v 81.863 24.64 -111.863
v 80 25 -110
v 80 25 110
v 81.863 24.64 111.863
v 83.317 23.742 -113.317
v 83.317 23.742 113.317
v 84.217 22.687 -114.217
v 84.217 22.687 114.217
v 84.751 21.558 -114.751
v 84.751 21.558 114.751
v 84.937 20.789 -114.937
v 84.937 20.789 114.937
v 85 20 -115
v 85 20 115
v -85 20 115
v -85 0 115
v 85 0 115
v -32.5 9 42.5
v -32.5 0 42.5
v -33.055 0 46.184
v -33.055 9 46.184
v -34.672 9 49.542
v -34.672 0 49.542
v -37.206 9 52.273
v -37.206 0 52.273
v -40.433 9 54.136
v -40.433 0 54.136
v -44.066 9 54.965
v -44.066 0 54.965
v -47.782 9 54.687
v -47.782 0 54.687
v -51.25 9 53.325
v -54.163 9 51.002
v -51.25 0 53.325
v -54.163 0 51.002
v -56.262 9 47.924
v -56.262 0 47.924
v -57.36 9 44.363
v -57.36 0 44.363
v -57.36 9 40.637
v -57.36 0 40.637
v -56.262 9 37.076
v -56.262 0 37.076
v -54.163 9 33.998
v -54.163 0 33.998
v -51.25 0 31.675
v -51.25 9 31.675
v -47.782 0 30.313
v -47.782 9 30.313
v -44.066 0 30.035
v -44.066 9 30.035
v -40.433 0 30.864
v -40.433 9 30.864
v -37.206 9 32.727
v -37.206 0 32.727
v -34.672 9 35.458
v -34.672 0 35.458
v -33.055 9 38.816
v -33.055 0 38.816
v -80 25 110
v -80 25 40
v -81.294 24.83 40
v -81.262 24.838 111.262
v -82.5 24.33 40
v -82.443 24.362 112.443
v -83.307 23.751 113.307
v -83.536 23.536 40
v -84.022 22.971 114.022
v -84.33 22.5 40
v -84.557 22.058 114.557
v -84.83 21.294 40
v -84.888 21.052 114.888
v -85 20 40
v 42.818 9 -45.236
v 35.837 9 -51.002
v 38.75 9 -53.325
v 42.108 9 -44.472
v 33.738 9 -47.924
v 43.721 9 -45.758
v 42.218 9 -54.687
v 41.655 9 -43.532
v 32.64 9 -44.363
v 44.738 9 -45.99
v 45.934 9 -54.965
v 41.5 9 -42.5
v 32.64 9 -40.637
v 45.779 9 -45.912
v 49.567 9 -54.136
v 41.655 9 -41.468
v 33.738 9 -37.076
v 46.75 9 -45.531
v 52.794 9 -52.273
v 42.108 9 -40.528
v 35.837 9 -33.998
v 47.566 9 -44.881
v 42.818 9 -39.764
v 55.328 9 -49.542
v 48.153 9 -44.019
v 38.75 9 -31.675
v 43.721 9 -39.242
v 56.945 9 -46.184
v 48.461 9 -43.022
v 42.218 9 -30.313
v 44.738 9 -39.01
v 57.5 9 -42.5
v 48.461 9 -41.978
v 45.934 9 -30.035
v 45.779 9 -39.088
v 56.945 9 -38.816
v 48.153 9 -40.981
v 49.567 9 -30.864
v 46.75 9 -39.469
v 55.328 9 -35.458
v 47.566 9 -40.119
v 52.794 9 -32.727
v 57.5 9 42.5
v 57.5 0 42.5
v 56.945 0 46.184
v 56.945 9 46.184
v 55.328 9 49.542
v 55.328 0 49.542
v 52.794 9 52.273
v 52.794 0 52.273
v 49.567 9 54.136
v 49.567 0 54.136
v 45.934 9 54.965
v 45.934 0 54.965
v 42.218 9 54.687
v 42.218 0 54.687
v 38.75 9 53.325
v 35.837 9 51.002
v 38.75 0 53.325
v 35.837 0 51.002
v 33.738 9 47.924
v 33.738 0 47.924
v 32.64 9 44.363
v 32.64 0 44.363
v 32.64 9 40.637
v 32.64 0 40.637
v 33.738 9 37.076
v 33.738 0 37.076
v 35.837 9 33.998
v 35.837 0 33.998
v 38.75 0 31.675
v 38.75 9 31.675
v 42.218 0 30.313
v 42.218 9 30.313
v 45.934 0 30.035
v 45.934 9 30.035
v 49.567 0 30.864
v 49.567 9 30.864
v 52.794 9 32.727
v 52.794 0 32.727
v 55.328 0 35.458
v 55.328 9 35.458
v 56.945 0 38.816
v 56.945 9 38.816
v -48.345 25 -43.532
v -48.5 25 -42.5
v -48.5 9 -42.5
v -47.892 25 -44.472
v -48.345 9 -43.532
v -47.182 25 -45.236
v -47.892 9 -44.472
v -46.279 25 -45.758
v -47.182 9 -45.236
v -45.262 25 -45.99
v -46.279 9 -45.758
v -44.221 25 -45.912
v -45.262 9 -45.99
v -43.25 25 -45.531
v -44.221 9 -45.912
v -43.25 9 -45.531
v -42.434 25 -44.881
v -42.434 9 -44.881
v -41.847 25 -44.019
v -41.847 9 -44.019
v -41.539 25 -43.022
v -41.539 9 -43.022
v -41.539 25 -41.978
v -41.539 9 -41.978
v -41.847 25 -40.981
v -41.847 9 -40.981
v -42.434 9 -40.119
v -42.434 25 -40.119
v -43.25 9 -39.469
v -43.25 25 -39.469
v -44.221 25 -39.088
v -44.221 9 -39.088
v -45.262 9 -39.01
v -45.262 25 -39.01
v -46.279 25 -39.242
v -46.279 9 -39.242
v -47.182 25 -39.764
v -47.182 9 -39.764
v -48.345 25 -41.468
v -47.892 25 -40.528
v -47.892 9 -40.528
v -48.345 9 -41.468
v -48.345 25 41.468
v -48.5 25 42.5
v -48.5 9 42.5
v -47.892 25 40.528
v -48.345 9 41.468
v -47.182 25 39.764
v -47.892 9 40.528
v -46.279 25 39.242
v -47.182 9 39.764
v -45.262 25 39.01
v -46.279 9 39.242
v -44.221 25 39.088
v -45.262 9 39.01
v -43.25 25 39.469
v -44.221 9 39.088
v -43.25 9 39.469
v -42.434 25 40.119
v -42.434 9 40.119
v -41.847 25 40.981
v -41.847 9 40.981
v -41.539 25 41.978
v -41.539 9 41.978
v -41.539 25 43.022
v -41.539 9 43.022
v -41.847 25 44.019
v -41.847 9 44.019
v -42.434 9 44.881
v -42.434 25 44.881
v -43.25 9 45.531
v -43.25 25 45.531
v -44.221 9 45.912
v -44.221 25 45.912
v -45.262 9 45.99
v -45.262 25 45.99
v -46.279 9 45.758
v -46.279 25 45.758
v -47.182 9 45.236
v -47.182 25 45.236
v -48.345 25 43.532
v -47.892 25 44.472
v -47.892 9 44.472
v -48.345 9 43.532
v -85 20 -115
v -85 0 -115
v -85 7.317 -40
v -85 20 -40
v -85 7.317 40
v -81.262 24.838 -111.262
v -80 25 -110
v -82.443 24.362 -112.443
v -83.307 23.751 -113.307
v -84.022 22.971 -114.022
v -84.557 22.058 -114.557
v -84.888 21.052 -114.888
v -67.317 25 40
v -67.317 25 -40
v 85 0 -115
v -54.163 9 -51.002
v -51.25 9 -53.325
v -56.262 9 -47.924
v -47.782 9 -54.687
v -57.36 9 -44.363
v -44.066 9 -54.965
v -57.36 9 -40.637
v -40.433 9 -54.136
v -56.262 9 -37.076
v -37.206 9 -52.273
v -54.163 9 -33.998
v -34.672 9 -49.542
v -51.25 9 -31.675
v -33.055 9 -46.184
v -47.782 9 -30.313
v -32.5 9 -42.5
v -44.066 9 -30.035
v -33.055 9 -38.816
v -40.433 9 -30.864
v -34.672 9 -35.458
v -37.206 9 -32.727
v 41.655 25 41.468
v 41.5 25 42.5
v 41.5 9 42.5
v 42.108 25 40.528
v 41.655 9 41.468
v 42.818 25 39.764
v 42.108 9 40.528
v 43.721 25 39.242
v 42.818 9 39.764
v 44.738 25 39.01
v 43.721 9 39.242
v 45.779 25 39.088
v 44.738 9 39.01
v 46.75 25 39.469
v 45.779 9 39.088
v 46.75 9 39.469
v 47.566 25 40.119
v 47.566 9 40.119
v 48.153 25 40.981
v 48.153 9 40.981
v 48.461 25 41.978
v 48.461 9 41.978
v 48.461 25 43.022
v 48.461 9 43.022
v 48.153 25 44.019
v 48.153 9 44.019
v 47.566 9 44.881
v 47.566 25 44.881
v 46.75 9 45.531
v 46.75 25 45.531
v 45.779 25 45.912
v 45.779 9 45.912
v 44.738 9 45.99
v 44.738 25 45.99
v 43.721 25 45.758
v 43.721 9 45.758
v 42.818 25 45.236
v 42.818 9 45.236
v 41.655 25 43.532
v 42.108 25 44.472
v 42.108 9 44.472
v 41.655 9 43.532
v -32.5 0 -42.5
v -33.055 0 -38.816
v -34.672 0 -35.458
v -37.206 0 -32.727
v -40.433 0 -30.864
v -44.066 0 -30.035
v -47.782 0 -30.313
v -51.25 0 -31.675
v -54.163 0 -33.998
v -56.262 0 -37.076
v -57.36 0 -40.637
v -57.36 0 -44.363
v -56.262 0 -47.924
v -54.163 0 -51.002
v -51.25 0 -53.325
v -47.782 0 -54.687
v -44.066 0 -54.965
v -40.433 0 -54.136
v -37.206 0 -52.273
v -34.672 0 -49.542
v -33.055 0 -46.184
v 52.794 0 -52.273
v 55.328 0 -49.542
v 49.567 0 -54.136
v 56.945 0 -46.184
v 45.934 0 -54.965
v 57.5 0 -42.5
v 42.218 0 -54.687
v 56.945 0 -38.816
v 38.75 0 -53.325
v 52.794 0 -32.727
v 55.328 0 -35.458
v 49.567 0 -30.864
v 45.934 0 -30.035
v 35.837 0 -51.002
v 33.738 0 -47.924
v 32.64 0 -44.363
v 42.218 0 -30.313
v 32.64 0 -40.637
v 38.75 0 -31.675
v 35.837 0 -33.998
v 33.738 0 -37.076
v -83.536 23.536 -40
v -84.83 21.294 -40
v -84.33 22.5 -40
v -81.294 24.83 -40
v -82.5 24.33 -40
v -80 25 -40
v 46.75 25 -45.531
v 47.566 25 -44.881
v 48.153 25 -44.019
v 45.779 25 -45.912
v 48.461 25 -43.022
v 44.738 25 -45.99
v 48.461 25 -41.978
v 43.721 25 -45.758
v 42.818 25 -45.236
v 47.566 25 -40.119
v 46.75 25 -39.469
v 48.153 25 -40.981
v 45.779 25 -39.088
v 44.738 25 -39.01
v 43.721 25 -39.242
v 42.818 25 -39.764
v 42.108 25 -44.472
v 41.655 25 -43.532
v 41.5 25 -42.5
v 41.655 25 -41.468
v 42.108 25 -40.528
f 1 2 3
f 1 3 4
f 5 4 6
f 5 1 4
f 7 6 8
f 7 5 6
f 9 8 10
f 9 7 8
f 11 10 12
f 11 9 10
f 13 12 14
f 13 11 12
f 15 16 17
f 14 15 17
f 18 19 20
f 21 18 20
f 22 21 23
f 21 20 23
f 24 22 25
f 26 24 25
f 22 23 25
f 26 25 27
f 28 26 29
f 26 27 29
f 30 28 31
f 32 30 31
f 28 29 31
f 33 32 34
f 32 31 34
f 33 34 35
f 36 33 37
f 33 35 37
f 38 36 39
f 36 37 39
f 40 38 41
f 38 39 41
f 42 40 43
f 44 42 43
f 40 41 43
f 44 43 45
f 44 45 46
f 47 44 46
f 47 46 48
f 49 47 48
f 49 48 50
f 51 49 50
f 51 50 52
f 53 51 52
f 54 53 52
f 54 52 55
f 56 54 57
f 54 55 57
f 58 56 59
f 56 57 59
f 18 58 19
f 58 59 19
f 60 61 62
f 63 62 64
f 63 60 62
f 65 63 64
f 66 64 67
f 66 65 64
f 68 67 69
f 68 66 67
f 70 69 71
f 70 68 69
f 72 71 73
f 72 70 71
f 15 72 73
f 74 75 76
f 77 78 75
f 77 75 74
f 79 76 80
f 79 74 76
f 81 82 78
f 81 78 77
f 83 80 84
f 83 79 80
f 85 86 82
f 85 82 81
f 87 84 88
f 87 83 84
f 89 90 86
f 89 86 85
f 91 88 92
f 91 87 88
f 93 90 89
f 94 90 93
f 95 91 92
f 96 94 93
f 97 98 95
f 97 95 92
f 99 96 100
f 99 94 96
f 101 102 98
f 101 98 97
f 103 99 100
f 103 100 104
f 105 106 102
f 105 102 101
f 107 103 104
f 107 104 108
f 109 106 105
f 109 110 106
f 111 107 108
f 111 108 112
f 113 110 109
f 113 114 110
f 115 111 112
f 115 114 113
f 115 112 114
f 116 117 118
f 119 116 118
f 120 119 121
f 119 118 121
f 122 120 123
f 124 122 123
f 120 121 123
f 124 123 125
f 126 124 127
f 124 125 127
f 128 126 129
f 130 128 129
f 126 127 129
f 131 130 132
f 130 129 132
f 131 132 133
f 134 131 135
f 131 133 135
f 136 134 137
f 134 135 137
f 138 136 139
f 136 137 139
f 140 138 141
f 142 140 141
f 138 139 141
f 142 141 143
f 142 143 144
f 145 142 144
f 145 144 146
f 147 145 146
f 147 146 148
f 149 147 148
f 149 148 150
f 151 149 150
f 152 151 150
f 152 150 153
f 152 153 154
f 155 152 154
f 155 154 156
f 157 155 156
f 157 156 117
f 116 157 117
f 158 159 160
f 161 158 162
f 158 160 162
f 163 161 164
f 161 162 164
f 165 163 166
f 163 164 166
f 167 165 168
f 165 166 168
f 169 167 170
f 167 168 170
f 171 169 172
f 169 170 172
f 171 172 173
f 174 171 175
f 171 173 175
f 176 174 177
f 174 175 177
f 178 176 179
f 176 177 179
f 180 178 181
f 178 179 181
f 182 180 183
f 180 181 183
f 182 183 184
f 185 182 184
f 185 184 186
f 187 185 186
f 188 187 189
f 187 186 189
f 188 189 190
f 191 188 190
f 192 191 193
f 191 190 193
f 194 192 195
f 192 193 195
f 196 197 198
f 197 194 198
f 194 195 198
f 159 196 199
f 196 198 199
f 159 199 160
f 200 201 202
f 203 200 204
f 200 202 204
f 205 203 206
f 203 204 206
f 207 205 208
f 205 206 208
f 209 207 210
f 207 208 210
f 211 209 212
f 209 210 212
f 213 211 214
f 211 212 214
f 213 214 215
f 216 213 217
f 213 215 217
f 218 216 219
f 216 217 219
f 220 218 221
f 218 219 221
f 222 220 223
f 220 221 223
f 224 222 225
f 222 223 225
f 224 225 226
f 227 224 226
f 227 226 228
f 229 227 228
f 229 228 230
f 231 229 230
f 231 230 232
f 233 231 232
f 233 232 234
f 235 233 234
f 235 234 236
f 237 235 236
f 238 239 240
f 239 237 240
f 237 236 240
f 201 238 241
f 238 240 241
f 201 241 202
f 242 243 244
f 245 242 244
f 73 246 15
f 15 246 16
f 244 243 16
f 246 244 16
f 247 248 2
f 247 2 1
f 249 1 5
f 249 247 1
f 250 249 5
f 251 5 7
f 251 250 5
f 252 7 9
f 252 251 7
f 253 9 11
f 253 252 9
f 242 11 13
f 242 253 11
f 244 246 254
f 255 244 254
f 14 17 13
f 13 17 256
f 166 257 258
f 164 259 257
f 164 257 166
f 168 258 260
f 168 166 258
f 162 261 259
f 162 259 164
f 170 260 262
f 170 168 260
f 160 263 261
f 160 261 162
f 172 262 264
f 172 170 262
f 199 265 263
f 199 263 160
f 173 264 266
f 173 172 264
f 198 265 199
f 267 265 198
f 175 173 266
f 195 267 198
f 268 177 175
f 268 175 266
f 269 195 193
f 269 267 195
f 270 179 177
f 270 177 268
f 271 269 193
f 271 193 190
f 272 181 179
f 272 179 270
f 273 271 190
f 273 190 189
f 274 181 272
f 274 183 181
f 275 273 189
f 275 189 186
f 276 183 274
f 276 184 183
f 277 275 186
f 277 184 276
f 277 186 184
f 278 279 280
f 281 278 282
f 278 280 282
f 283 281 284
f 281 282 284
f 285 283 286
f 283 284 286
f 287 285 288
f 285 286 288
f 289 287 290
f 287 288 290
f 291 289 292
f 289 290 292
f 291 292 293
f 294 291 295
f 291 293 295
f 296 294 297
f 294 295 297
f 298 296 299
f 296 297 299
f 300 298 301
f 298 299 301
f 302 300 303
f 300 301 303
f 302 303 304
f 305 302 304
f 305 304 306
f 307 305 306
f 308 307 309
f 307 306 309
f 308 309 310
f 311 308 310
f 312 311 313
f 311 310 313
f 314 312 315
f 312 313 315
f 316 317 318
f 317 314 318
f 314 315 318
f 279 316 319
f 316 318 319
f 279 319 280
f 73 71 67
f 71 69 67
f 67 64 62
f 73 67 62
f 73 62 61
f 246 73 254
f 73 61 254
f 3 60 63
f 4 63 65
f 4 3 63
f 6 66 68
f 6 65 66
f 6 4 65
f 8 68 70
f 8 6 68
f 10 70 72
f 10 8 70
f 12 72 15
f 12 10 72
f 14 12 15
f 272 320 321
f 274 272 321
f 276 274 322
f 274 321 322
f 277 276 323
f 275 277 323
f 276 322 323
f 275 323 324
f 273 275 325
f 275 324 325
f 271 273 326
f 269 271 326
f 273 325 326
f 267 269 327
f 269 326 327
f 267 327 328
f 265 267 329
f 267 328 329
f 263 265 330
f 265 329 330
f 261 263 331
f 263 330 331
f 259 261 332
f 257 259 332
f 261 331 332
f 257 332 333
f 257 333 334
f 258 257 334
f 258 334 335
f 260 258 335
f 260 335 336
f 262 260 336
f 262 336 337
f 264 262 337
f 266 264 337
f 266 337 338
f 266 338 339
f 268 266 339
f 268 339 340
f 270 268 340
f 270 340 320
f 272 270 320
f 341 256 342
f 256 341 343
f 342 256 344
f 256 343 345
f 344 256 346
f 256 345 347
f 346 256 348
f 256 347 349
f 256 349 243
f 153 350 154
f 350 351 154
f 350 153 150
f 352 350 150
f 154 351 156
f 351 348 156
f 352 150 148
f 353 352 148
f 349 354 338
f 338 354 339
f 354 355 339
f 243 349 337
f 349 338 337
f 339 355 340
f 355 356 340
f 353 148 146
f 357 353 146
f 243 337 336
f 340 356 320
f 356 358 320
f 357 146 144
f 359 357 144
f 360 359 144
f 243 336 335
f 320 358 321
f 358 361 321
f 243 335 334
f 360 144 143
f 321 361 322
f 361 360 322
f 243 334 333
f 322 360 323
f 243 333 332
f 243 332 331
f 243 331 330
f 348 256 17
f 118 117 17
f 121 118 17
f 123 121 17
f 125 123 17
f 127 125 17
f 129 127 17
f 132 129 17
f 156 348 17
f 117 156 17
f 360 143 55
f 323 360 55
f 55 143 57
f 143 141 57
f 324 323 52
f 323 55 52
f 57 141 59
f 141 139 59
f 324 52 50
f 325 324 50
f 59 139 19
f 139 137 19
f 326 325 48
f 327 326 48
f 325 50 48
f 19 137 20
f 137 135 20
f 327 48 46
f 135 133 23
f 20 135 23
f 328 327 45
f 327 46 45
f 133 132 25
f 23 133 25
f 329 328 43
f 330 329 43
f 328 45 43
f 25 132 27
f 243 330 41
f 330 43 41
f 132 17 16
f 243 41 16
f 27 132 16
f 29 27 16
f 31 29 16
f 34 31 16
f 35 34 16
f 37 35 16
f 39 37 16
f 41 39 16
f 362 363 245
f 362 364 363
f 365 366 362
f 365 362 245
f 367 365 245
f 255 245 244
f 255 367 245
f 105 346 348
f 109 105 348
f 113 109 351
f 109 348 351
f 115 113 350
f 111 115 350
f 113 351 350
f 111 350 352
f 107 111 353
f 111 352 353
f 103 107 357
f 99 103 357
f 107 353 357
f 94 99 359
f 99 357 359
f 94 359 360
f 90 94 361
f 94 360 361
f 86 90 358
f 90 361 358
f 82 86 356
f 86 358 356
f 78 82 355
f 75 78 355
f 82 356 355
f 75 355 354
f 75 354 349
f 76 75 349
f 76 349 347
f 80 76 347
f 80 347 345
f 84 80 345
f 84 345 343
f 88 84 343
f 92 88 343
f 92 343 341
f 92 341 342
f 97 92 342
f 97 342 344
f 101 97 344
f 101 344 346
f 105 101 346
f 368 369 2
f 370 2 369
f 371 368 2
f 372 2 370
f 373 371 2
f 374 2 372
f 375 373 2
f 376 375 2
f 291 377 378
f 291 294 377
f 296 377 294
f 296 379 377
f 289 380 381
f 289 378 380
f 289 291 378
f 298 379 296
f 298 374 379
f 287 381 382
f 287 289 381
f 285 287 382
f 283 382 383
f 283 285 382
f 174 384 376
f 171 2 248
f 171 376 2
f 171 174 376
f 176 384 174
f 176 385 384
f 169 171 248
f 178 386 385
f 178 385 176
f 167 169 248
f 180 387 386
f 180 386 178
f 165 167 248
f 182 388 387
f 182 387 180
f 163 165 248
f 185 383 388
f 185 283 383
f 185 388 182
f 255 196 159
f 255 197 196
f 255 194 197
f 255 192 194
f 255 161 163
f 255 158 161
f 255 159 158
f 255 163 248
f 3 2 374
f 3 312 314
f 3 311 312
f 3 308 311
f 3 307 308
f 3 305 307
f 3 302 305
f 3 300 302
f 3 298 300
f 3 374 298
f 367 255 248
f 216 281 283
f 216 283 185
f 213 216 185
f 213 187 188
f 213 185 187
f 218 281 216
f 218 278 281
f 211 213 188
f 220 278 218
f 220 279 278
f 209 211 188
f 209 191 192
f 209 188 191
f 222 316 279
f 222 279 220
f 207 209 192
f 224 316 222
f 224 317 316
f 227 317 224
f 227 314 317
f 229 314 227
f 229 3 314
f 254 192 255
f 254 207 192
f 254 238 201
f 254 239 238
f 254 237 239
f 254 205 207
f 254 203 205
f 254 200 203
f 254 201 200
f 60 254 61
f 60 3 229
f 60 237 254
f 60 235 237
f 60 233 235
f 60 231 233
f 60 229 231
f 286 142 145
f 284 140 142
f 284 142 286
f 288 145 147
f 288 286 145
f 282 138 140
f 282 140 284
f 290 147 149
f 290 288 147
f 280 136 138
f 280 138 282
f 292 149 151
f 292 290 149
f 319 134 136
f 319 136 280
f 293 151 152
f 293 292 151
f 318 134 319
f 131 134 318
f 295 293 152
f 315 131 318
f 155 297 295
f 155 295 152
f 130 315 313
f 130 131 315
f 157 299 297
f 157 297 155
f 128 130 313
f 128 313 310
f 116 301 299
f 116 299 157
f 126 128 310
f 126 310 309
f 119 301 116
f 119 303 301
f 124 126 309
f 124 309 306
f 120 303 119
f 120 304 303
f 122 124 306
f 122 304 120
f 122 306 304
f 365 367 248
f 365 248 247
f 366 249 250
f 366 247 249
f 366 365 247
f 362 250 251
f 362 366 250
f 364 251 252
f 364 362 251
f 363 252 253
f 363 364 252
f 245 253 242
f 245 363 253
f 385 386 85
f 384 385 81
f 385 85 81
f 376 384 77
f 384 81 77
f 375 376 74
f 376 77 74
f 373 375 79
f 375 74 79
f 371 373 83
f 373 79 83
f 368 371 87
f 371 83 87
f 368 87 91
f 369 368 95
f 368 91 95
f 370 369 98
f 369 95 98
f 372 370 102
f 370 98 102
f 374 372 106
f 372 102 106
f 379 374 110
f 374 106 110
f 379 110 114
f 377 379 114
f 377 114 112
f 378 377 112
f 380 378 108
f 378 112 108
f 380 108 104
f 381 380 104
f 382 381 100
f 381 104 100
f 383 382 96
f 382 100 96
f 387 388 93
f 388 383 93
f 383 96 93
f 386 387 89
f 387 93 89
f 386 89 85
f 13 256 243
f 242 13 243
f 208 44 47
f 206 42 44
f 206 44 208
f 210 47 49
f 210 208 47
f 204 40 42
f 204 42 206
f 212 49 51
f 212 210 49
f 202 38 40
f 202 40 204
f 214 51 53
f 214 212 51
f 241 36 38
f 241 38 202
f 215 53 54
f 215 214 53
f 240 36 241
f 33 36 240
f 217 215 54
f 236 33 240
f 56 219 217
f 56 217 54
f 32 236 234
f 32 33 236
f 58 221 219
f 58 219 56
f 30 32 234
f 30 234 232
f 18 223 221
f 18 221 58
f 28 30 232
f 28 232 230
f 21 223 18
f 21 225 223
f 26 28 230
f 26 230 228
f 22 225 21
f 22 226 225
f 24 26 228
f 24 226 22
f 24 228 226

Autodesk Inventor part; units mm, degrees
ref_plane "YZ Plane" through (0, 0, 0) normal (1, 0, 0) x (0, 1, 0)
ref_plane "XZ Plane" through (0, 0, 0) normal (0, 1, 0) x (-1, 0, 0)
ref_plane "XY Plane" through (0, 0, 0) normal (0, 0, 1) x (1, 0, 0)
sketch "Sketch1" plane through (0, 0, 0) normal (0, 1, 0) x (-1, 0, 0)
  line L0 (85, 115) -> (-85, 115)
  line L1 (-85, 115) -> (-85, -115)
  line L2 (-85, -115) -> (85, -115)
  line L3 (85, -115) -> (85, 115)
  line L4 (85, 115) -> (-85, -115) construction
  line L5 (-85, 115) -> (85, -115) construction
  line L6 (-85, 115) -> (-85, 42.5) construction
  line L7 (-85, 42.5) -> (-85, -42.5) construction
  line L8 (-85, 42.5) -> (-45, 42.5) construction
  line L9 (-45, 42.5) -> (45, 42.5) construction
  line L10 (45, 42.5) -> (45, -42.5) construction
  line L11 (-85, -42.5) -> (-45, -42.5) construction
  line L12 (-45, -42.5) -> (45, -42.5) construction
  circle A0 centre (-45, 42.5) radius 3.5
  circle A1 centre (45, 42.5) radius 3.5
  circle A2 centre (45, -42.5) radius 3.5
  line L13 (-45, 42.5) -> (-45, -42.5) construction
  circle A3 centre (-45, -42.5) radius 3.5
  point P0 (0, 0)
  dimension "d3" = 85
  dimension "d7" = 7
  dimension "d8" = 7
extrude "Extrusion1" add sketch "Sketch1" along normal blind 25
sketch "Sketch2" plane through (0, 0, 0) normal (0, -1, 0) x (1, 0, 0)
  circle A0 centre (-45, -42.5) radius 3.5 projected
  circle A1 centre (-45, -42.5) radius 12.5
  circle A2 centre (-45, 42.5) radius 3.5 projected
  circle A3 centre (-45, 42.5) radius 12.5
  circle A4 centre (45, 42.5) radius 3.5 projected
  circle A5 centre (45, 42.5) radius 12.5
  circle A6 centre (45, -42.5) radius 3.5 projected
  circle A7 centre (45, -42.5) radius 12.5
  point P0 (0, 0)
extrude "Extrusion2" cut sketch "Sketch2" against normal blind 9
sketch "Sketch3" plane through (-85, 0, 115) normal (0, 0, 1) x (1, 0, 0)
  point P0 (85, 0)
sketch "Sketch4" plane through (0, 0, 0) normal (0, 0, 1) x (1, 0, 0)
  line L0 (-85, 0) -> (-85, 25) projected
  line L1 (-85, 7.3168) -> (-67.3168, 25)
  line L2 (-85, 25) -> (85, 25) projected
  line L3 (-85, 7.3168) -> (-59.9922, 7.3168) construction
  point P0 (0, 0)
  dimension "d15" = 45
extrude "Extrusion3" cut sketch "Sketch4" along normal mid plane 80
fillet "Fillet1" radius 5 5 edges at (85, 25, 0) (0, 25, 115) (-85, 25, 77.5) (-85, 25, -77.5) (0, 25, -115)
properties part number "Base"
